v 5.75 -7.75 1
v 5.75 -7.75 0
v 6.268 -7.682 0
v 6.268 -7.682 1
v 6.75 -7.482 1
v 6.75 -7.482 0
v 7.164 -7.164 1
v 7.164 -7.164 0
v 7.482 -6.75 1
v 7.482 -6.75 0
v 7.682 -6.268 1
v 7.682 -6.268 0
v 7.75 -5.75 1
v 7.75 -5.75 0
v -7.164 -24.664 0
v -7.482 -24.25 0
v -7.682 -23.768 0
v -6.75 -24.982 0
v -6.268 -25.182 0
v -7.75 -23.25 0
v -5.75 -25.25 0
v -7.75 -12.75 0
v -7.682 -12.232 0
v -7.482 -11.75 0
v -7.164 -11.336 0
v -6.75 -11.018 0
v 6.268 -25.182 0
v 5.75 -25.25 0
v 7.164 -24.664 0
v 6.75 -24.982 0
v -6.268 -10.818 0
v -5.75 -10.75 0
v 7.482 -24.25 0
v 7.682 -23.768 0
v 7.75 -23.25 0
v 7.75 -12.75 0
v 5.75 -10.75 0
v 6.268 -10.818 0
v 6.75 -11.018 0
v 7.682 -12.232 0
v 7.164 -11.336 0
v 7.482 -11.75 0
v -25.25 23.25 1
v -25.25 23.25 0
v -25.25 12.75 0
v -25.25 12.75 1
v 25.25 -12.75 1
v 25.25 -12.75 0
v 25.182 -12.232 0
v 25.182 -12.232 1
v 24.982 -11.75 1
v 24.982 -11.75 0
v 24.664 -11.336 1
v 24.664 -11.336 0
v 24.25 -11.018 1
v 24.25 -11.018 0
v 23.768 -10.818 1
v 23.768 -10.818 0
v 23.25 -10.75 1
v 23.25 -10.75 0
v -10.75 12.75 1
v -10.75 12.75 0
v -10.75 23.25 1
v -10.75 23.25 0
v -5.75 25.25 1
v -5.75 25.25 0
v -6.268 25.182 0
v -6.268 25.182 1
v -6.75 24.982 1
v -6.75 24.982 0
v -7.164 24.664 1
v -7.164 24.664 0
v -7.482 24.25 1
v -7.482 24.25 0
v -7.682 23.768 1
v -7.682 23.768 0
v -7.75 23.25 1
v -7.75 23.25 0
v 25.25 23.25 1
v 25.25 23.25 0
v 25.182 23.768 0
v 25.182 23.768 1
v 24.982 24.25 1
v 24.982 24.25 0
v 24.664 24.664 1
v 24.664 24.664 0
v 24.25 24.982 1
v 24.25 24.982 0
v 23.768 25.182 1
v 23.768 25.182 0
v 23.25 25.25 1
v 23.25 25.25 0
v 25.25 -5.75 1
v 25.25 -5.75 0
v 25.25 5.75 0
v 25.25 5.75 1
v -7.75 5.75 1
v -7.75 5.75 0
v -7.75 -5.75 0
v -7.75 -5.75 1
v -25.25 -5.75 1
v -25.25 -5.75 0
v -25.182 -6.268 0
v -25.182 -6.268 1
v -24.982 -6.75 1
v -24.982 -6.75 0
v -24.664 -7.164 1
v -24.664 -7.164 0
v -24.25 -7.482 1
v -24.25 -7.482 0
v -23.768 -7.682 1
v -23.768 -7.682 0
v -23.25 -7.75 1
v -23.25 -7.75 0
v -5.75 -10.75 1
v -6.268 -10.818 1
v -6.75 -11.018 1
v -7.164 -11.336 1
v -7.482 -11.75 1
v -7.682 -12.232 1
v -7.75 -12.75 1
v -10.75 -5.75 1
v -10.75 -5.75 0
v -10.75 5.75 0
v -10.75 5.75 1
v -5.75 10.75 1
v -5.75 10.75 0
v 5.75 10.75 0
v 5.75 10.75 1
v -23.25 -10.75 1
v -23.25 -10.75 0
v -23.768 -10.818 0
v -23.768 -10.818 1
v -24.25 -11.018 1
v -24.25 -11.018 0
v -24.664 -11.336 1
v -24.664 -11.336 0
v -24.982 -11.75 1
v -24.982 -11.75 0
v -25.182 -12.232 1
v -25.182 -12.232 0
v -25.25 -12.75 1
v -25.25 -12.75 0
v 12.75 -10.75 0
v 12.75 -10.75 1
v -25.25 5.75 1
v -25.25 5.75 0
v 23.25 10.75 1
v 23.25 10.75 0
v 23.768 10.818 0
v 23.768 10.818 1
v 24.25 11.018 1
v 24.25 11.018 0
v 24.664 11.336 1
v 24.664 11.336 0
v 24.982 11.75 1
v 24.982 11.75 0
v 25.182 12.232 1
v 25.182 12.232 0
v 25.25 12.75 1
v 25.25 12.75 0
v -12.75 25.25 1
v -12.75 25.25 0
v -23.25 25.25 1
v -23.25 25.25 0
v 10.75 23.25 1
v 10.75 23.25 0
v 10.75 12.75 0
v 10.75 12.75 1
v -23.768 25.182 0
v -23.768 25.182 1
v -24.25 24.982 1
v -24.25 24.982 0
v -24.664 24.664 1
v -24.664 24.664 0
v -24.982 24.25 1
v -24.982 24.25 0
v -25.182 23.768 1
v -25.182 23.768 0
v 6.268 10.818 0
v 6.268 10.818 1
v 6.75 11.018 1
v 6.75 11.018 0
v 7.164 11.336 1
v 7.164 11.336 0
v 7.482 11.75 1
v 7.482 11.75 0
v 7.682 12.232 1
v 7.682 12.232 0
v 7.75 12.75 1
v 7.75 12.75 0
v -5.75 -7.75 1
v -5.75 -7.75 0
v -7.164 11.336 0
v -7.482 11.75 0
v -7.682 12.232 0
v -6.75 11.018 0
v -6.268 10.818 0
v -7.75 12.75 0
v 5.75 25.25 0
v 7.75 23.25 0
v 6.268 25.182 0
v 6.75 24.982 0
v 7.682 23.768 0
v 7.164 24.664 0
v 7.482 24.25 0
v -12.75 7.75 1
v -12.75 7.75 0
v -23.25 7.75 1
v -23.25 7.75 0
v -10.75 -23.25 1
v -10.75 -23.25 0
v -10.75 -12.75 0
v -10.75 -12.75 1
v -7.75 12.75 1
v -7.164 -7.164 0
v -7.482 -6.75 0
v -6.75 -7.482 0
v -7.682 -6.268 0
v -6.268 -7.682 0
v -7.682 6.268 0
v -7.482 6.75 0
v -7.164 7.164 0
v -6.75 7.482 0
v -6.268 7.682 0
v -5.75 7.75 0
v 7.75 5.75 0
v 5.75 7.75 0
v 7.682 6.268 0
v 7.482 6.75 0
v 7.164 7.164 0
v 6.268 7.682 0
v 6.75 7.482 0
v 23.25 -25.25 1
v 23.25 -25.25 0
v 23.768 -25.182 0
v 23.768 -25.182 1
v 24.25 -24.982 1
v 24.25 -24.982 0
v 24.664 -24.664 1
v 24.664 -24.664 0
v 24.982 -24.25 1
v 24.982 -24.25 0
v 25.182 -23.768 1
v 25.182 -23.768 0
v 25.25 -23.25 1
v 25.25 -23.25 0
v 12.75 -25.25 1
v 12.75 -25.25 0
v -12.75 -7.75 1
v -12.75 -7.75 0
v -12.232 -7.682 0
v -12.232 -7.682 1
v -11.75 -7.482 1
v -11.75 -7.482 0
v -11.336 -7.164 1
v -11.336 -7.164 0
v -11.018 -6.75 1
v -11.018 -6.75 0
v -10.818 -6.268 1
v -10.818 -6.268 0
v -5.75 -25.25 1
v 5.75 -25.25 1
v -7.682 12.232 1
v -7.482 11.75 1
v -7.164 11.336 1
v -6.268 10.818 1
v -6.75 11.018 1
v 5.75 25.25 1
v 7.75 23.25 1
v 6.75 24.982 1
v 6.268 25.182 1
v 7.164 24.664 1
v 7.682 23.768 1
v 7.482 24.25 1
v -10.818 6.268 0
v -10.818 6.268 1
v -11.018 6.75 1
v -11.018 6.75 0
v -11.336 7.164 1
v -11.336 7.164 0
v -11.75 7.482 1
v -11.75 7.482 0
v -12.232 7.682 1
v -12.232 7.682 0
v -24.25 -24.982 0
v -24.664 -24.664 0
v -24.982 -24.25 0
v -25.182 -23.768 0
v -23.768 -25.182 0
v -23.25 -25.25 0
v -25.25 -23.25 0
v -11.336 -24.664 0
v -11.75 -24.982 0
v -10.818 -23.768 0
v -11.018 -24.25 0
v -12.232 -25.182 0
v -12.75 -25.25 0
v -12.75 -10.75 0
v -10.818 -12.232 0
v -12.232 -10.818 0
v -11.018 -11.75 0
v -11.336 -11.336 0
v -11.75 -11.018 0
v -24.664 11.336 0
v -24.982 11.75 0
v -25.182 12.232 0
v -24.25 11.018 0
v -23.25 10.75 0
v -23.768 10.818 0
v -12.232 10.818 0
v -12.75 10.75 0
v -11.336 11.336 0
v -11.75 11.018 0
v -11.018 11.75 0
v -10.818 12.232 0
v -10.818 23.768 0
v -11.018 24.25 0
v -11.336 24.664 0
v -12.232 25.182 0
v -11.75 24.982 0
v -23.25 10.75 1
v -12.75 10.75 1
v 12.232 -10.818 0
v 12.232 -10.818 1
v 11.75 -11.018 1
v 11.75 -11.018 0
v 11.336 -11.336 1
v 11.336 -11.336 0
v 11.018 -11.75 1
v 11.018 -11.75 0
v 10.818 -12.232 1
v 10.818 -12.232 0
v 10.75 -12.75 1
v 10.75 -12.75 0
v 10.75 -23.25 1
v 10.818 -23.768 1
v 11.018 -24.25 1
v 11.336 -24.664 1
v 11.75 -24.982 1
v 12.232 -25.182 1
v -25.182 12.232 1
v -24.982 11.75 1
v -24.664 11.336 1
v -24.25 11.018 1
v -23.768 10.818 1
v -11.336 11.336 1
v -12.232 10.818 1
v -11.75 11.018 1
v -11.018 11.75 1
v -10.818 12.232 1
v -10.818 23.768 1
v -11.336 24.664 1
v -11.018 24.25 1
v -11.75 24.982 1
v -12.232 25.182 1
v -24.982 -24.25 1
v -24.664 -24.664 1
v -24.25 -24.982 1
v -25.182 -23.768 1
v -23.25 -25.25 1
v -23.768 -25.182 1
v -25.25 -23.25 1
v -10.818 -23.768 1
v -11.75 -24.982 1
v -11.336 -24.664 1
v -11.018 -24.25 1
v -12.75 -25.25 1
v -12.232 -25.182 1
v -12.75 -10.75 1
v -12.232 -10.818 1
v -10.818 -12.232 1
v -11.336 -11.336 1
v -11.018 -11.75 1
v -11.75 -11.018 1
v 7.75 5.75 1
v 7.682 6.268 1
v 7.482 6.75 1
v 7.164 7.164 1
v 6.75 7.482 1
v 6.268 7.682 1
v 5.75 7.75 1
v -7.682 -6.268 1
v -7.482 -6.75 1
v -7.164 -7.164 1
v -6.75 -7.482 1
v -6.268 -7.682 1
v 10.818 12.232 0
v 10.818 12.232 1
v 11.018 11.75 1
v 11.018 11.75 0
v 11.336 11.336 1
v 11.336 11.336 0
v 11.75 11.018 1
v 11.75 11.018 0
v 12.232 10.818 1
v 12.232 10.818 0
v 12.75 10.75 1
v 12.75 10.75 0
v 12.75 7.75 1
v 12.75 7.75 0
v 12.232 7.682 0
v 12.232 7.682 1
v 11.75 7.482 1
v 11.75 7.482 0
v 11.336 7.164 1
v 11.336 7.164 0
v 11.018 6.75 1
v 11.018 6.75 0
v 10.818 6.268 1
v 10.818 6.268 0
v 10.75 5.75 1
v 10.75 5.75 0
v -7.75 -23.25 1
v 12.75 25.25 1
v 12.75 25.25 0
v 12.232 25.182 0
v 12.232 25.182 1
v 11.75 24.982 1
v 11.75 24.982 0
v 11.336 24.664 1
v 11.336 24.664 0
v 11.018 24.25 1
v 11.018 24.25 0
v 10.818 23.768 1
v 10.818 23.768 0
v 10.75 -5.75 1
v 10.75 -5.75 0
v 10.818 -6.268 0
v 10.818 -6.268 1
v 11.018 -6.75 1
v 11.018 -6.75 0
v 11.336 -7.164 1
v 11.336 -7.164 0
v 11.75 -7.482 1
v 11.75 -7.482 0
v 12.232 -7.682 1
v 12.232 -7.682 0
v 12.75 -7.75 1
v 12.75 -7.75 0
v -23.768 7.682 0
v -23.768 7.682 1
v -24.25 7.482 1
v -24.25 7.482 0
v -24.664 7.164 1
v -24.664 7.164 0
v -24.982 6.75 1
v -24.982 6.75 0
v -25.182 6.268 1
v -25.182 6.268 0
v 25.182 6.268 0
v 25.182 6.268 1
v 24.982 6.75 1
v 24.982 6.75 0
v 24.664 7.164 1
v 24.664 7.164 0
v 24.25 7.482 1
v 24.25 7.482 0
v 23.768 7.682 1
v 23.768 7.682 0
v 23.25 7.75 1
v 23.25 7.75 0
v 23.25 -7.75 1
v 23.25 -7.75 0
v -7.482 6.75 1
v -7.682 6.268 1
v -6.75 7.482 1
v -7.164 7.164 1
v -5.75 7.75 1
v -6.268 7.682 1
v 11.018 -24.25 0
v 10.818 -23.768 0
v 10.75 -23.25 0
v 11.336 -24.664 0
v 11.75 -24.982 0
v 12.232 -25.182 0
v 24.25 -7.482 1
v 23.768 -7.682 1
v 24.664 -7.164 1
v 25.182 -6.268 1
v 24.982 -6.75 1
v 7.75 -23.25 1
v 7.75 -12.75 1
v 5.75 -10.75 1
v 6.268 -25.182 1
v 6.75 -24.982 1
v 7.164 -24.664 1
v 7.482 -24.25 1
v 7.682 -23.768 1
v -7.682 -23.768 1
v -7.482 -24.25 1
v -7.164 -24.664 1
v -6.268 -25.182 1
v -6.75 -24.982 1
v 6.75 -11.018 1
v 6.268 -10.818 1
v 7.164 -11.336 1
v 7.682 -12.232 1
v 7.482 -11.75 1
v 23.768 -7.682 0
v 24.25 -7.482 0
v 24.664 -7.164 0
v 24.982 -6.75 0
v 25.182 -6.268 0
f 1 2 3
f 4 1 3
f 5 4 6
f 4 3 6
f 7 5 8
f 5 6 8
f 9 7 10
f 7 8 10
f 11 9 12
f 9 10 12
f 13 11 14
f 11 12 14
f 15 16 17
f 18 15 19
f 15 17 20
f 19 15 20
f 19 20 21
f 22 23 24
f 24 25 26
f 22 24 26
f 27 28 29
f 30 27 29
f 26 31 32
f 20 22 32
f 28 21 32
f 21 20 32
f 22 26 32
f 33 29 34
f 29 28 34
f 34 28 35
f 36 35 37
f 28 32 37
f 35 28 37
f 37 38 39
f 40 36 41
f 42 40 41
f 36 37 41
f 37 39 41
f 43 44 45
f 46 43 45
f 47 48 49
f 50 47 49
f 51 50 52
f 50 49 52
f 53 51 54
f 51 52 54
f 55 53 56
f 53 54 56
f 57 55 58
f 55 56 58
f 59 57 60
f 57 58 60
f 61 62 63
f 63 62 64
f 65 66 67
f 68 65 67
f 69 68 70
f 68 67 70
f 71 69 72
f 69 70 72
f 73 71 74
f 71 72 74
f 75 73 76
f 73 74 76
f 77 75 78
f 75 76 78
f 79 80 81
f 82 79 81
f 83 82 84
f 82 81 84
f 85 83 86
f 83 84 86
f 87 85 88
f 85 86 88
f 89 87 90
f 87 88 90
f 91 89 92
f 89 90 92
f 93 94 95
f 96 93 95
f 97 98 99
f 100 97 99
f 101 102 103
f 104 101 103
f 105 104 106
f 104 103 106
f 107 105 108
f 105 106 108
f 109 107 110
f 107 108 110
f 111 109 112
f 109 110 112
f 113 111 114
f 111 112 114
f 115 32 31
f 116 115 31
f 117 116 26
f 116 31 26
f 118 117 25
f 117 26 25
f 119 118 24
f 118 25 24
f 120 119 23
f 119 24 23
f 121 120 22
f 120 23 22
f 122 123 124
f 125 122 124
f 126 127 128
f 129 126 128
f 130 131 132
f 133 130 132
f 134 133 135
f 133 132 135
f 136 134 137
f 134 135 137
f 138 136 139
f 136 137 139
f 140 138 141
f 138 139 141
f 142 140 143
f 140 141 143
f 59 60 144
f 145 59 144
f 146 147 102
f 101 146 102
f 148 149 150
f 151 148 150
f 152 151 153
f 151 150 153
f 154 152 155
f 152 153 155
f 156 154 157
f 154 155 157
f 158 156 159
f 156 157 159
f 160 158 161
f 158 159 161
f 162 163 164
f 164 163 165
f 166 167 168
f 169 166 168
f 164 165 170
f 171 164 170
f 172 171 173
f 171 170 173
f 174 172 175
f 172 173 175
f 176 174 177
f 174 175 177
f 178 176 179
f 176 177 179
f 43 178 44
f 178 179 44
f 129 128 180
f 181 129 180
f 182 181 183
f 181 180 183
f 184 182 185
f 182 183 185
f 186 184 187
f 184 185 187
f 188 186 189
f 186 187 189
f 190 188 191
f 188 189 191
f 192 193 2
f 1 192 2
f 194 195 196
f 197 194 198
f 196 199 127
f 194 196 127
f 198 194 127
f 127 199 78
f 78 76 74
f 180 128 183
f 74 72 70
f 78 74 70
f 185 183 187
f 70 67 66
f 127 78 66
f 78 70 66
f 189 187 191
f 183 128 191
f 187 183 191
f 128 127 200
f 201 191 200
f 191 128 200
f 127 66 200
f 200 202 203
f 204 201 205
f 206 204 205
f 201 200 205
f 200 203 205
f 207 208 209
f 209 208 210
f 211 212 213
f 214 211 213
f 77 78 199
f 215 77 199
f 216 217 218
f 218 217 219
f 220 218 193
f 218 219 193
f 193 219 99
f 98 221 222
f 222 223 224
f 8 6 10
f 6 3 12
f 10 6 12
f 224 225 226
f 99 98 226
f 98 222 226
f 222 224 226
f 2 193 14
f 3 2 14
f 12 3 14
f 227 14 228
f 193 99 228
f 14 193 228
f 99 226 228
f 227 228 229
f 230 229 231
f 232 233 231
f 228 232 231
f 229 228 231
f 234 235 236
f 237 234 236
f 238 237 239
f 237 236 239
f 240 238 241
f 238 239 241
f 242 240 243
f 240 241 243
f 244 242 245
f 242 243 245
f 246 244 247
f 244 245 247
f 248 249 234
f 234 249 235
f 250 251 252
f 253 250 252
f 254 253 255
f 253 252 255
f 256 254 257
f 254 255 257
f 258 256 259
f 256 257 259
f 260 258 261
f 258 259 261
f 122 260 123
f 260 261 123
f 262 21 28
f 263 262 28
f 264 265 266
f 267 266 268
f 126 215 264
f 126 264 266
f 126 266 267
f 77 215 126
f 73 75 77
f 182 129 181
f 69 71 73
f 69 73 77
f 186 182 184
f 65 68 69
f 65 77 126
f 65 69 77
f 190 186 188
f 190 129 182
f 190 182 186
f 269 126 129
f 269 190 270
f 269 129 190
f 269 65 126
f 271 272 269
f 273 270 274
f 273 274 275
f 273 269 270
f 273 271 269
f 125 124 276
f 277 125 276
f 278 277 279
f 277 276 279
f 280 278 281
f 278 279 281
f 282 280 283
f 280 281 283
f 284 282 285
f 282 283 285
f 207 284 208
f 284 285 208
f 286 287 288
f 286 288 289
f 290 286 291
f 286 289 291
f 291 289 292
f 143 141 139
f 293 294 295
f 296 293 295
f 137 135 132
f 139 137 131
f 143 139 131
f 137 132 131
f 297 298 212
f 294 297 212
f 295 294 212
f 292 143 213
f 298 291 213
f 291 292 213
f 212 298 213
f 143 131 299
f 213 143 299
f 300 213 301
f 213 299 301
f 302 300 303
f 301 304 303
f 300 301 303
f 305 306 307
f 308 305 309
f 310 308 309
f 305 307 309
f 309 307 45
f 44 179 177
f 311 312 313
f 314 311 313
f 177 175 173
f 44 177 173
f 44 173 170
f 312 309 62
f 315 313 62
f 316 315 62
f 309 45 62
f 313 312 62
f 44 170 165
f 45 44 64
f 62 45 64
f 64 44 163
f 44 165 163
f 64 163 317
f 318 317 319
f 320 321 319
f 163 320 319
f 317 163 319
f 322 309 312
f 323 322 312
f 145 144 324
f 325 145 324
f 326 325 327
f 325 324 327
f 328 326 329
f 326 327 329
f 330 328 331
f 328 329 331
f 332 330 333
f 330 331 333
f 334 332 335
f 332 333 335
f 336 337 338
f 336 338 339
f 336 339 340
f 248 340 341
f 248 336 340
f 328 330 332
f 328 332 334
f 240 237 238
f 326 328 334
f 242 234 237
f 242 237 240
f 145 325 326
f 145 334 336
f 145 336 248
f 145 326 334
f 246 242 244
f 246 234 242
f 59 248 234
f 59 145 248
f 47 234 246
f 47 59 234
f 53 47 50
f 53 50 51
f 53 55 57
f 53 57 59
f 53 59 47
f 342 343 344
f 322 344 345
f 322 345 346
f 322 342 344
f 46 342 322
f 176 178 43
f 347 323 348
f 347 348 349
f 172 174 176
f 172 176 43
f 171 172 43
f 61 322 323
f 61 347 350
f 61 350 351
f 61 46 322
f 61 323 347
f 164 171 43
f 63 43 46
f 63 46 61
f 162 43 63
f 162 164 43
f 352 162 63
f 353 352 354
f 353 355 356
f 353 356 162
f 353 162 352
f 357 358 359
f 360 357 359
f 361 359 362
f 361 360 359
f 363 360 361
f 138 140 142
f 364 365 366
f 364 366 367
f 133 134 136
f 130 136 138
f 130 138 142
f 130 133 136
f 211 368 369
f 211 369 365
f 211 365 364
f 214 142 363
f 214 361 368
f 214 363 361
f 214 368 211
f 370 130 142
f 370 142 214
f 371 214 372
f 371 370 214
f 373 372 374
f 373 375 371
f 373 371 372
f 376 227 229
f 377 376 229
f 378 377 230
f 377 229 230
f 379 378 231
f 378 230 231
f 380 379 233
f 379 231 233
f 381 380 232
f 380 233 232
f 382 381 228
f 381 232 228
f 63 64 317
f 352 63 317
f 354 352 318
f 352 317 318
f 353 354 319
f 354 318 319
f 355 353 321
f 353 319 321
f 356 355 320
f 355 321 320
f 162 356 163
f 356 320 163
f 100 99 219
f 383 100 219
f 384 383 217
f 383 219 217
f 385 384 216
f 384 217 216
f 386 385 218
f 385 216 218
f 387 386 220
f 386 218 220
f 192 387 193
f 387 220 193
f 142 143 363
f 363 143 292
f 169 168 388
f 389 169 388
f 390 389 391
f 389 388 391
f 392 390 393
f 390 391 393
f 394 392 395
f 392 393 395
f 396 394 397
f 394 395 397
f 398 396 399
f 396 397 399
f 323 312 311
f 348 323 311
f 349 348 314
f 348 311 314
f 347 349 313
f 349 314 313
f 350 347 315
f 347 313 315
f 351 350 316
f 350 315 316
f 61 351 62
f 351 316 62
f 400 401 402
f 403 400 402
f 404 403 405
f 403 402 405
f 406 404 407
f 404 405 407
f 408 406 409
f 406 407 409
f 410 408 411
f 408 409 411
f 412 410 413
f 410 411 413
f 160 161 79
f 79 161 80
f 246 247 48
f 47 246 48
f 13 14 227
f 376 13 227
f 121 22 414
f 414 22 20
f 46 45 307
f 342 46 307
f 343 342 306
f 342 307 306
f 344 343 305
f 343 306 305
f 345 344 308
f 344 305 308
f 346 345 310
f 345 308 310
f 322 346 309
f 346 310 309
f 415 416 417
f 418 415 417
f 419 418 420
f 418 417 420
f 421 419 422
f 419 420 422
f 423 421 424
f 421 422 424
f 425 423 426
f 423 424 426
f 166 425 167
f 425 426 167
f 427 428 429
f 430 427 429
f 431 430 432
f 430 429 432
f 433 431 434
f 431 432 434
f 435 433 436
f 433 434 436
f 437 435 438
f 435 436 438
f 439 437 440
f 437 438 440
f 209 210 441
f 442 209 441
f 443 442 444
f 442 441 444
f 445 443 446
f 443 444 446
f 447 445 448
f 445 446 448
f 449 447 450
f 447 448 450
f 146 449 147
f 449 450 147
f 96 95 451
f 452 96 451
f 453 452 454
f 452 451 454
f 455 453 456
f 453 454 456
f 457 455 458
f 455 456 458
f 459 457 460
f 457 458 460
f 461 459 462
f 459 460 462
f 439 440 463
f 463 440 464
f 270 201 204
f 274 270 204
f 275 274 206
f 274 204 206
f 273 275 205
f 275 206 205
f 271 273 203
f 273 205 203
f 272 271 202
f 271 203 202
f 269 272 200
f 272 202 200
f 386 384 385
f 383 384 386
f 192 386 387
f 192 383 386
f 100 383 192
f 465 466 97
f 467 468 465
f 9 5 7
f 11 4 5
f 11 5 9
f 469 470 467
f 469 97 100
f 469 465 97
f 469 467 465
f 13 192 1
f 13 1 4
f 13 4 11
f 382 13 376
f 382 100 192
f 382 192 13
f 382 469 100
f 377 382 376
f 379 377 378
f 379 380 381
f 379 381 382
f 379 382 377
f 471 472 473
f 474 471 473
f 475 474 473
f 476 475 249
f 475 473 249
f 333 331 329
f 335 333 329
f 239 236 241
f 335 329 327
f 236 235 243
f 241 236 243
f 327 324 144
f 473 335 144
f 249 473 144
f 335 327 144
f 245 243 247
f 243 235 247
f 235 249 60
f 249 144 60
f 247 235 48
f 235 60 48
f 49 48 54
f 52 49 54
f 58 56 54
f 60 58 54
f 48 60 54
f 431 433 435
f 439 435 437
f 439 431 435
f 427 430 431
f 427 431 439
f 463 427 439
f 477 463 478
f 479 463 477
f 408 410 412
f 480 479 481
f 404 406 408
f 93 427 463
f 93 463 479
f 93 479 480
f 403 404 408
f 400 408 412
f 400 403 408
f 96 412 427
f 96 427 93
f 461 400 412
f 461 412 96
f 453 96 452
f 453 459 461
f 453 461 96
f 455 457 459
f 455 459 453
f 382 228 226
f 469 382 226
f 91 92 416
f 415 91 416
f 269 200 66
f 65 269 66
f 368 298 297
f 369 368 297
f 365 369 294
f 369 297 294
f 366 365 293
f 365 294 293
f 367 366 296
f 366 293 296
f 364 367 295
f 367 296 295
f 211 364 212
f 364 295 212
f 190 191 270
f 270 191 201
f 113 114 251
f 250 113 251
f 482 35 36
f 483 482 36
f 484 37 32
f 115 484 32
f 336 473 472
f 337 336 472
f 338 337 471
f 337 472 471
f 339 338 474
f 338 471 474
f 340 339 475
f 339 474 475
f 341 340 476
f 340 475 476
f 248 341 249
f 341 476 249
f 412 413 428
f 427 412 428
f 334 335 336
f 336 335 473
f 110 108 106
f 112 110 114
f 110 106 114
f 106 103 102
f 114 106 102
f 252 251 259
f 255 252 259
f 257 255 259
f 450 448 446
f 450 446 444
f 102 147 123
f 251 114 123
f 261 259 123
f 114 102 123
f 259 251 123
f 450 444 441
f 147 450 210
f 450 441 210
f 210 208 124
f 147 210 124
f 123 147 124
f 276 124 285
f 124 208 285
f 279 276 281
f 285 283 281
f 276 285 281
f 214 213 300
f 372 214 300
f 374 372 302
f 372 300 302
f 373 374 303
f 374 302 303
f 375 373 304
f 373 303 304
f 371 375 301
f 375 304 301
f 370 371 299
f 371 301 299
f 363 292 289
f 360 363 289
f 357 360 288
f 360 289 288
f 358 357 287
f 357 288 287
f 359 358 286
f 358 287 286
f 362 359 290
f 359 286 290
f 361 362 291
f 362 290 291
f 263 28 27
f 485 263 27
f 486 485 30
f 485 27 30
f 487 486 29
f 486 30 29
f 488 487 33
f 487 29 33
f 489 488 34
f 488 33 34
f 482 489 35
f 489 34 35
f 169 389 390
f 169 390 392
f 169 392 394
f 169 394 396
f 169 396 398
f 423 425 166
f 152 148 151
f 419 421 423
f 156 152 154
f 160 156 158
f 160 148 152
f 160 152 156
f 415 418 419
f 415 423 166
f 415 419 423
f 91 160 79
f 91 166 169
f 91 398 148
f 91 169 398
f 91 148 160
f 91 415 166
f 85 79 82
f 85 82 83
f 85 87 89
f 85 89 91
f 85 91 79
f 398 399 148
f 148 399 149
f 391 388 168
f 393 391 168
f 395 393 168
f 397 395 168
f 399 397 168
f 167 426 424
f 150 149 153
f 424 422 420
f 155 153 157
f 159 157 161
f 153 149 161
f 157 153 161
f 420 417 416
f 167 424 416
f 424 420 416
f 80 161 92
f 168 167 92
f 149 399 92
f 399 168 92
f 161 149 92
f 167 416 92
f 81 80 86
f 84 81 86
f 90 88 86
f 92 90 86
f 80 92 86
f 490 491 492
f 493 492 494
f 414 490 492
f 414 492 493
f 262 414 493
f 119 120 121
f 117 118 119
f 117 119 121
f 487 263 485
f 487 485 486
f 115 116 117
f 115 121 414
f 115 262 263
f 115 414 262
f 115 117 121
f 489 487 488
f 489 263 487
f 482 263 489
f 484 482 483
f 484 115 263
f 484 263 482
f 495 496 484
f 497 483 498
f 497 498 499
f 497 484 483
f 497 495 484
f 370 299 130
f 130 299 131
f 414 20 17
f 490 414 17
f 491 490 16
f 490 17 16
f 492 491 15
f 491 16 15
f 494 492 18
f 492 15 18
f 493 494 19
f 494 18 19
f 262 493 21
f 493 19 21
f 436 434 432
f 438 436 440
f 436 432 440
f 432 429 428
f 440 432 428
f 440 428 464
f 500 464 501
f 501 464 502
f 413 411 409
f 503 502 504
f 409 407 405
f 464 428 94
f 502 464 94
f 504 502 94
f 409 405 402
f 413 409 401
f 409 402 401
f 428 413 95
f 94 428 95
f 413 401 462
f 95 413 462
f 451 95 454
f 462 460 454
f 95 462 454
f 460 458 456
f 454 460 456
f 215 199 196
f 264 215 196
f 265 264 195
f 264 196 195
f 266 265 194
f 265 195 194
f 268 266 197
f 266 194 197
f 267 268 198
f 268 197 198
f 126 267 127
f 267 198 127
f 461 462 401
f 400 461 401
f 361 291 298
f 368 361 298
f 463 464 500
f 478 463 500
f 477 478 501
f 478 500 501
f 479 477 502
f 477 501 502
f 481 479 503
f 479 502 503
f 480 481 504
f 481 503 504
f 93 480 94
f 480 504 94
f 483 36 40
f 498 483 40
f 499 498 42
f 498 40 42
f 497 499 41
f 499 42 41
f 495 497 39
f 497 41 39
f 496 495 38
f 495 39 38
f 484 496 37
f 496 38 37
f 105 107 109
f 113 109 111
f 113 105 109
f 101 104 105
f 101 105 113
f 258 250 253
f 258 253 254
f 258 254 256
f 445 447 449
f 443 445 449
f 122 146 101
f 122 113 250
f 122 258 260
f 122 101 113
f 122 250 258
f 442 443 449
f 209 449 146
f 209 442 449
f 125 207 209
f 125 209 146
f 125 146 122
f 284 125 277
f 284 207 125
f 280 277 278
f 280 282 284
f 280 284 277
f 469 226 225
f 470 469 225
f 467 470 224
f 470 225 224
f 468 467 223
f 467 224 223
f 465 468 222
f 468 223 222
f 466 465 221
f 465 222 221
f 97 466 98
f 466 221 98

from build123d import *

# Parameters (mm, degrees)
F1_DEPTH = 1


with BuildPart() as f1:
    # F0 (on Top) → F1 (new body)
    with BuildSketch(Plane.XY):
        with BuildLine():
            Line((-12.75, -10.75), (-23.25, -10.75))
            ThreePointArc((-23.25, -10.75), (-24.6642135624, -11.3357864376), (-25.25, -12.75))
            Line((-25.25, -12.75), (-25.25, -23.25))
            ThreePointArc((-25.25, -23.25), (-24.6642135624, -24.6642135624), (-23.25, -25.25))
            Line((-23.25, -25.25), (-12.75, -25.25))
            ThreePointArc((-12.75, -25.25), (-11.3357864376, -24.6642135624), (-10.75, -23.25))
            Line((-10.75, -23.25), (-10.75, -12.75))
            ThreePointArc((-10.75, -12.75), (-11.3357864376, -11.3357864376), (-12.75, -10.75))
        make_face()
    extrude(amount=F1_DEPTH)


with BuildPart() as f1b:
    # F0 (on Top) → F1, piece 2 (new body)
    with BuildSketch(Plane.XY):
        with BuildLine():
            Line((5.75, -10.75), (-5.75, -10.75))
            ThreePointArc((-5.75, -10.75), (-7.1642135624, -11.3357864376), (-7.75, -12.75))
            Line((-7.75, -12.75), (-7.75, -23.25))
            ThreePointArc((-7.75, -23.25), (-7.1642135624, -24.6642135624), (-5.75, -25.25))
            Line((-5.75, -25.25), (5.75, -25.25))
            ThreePointArc((5.75, -25.25), (7.1642135624, -24.6642135624), (7.75, -23.25))
            Line((7.75, -23.25), (7.75, -12.75))
            ThreePointArc((7.75, -12.75), (7.1642135624, -11.3357864376), (5.75, -10.75))
        make_face()
    extrude(amount=F1_DEPTH)


with BuildPart() as f1c:
    # F0 (on Top) → F1, piece 3 (new body)
    with BuildSketch(Plane.XY):
        with BuildLine():
            ThreePointArc((7.75, 5.75), (7.1642135624, 7.1642135624), (5.75, 7.75))
            Line((5.75, 7.75), (-5.75, 7.75))
            ThreePointArc((-5.75, 7.75), (-7.1642135624, 7.1642135624), (-7.75, 5.75))
            Line((-7.75, 5.75), (-7.75, -5.75))
            ThreePointArc((-7.75, -5.75), (-7.1642135624, -7.1642135624), (-5.75, -7.75))
            Line((-5.75, -7.75), (5.75, -7.75))
            ThreePointArc((5.75, -7.75), (7.1642135624, -7.1642135624), (7.75, -5.75))
            Line((7.75, -5.75), (7.75, 5.75))
        make_face()
    extrude(amount=F1_DEPTH)


with BuildPart() as f1d:
    # F0 (on Top) → F1, piece 4 (new body)
    with BuildSketch(Plane.XY):
        with BuildLine():
            Line((10.75, 5.75), (10.75, -5.75))
            ThreePointArc((10.75, -5.75), (11.3357864376, -7.1642135624), (12.75, -7.75))
            Line((12.75, -7.75), (23.25, -7.75))
            ThreePointArc((23.25, -7.75), (24.6642135624, -7.1642135624), (25.25, -5.75))
            Line((25.25, -5.75), (25.25, 5.75))
            ThreePointArc((25.25, 5.75), (24.6642135624, 7.1642135624), (23.25, 7.75))
            Line((23.25, 7.75), (12.75, 7.75))
            ThreePointArc((12.75, 7.75), (11.3357864376, 7.1642135624), (10.75, 5.75))
        make_face()
    extrude(amount=F1_DEPTH)


with BuildPart() as f1e:
    # F0 (on Top) → F1, piece 5 (new body)
    with BuildSketch(Plane.XY):
        with BuildLine():
            ThreePointArc((10.75, -23.25), (11.3357864376, -24.6642135624), (12.75, -25.25))
            Line((12.75, -25.25), (23.25, -25.25))
            ThreePointArc((23.25, -25.25), (24.6642135624, -24.6642135624), (25.25, -23.25))
            Line((25.25, -23.25), (25.25, -12.75))
            ThreePointArc((25.25, -12.75), (24.6642135624, -11.3357864376), (23.25, -10.75))
            Line((23.25, -10.75), (12.75, -10.75))
            ThreePointArc((12.75, -10.75), (11.3357864376, -11.3357864376), (10.75, -12.75))
            Line((10.75, -12.75), (10.75, -23.25))
        make_face()
    extrude(amount=F1_DEPTH)


with BuildPart() as f1f:
    # F0 (on Top) → F1, piece 6 (new body)
    with BuildSketch(Plane.XY):
        with BuildLine():
            Line((-5.75, 10.75), (5.75, 10.75))
            ThreePointArc((5.75, 10.75), (7.1642135624, 11.3357864376), (7.75, 12.75))
            Line((7.75, 12.75), (7.75, 23.25))
            ThreePointArc((7.75, 23.25), (7.1642135624, 24.6642135624), (5.75, 25.25))
            Line((5.75, 25.25), (-5.75, 25.25))
            ThreePointArc((-5.75, 25.25), (-7.1642135624, 24.6642135624), (-7.75, 23.25))
            Line((-7.75, 23.25), (-7.75, 12.75))
            ThreePointArc((-7.75, 12.75), (-7.1642135624, 11.3357864376), (-5.75, 10.75))
        make_face()
    extrude(amount=F1_DEPTH)


with BuildPart() as f1g:
    # F0 (on Top) → F1, piece 7 (new body)
    with BuildSketch(Plane.XY):
        with BuildLine():
            ThreePointArc((23.25, 10.75), (24.6642135624, 11.3357864376), (25.25, 12.75))
            Line((25.25, 12.75), (25.25, 23.25))
            ThreePointArc((25.25, 23.25), (24.6642135624, 24.6642135624), (23.25, 25.25))
            Line((23.25, 25.25), (12.75, 25.25))
            ThreePointArc((12.75, 25.25), (11.3357864376, 24.6642135624), (10.75, 23.25))
            Line((10.75, 23.25), (10.75, 12.75))
            ThreePointArc((10.75, 12.75), (11.3357864376, 11.3357864376), (12.75, 10.75))
            Line((12.75, 10.75), (23.25, 10.75))
        make_face()
    extrude(amount=F1_DEPTH)


with BuildPart() as f1h:
    # F0 (on Top) → F1, piece 8 (new body)
    with BuildSketch(Plane.XY):
        with BuildLine():
            Line((-10.75, -5.75), (-10.75, 5.75))
            ThreePointArc((-10.75, 5.75), (-11.3357864376, 7.1642135624), (-12.75, 7.75))
            Line((-12.75, 7.75), (-23.25, 7.75))
            ThreePointArc((-23.25, 7.75), (-24.6642135624, 7.1642135624), (-25.25, 5.75))
            Line((-25.25, 5.75), (-25.25, -5.75))
            ThreePointArc((-25.25, -5.75), (-24.6642135624, -7.1642135624), (-23.25, -7.75))
            Line((-23.25, -7.75), (-12.75, -7.75))
            ThreePointArc((-12.75, -7.75), (-11.3357864376, -7.1642135624), (-10.75, -5.75))
        make_face()
    extrude(amount=F1_DEPTH)


with BuildPart() as f1i:
    # F0 (on Top) → F1, piece 9 (new body)
    with BuildSketch(Plane.XY):
        with BuildLine():
            ThreePointArc((-10.75, 23.25), (-11.3357864376, 24.6642135624), (-12.75, 25.25))
            Line((-12.75, 25.25), (-23.25, 25.25))
            ThreePointArc((-23.25, 25.25), (-24.6642135624, 24.6642135624), (-25.25, 23.25))
            Line((-25.25, 23.25), (-25.25, 12.75))
            ThreePointArc((-25.25, 12.75), (-24.6642135624, 11.3357864376), (-23.25, 10.75))
            Line((-23.25, 10.75), (-12.75, 10.75))
            ThreePointArc((-12.75, 10.75), (-11.3357864376, 11.3357864376), (-10.75, 12.75))
            Line((-10.75, 12.75), (-10.75, 23.25))
        make_face()
    extrude(amount=F1_DEPTH)


solid = Compound([f1.part, f1b.part, f1c.part, f1d.part, f1e.part, f1f.part, f1g.part, f1h.part, f1i.part])
